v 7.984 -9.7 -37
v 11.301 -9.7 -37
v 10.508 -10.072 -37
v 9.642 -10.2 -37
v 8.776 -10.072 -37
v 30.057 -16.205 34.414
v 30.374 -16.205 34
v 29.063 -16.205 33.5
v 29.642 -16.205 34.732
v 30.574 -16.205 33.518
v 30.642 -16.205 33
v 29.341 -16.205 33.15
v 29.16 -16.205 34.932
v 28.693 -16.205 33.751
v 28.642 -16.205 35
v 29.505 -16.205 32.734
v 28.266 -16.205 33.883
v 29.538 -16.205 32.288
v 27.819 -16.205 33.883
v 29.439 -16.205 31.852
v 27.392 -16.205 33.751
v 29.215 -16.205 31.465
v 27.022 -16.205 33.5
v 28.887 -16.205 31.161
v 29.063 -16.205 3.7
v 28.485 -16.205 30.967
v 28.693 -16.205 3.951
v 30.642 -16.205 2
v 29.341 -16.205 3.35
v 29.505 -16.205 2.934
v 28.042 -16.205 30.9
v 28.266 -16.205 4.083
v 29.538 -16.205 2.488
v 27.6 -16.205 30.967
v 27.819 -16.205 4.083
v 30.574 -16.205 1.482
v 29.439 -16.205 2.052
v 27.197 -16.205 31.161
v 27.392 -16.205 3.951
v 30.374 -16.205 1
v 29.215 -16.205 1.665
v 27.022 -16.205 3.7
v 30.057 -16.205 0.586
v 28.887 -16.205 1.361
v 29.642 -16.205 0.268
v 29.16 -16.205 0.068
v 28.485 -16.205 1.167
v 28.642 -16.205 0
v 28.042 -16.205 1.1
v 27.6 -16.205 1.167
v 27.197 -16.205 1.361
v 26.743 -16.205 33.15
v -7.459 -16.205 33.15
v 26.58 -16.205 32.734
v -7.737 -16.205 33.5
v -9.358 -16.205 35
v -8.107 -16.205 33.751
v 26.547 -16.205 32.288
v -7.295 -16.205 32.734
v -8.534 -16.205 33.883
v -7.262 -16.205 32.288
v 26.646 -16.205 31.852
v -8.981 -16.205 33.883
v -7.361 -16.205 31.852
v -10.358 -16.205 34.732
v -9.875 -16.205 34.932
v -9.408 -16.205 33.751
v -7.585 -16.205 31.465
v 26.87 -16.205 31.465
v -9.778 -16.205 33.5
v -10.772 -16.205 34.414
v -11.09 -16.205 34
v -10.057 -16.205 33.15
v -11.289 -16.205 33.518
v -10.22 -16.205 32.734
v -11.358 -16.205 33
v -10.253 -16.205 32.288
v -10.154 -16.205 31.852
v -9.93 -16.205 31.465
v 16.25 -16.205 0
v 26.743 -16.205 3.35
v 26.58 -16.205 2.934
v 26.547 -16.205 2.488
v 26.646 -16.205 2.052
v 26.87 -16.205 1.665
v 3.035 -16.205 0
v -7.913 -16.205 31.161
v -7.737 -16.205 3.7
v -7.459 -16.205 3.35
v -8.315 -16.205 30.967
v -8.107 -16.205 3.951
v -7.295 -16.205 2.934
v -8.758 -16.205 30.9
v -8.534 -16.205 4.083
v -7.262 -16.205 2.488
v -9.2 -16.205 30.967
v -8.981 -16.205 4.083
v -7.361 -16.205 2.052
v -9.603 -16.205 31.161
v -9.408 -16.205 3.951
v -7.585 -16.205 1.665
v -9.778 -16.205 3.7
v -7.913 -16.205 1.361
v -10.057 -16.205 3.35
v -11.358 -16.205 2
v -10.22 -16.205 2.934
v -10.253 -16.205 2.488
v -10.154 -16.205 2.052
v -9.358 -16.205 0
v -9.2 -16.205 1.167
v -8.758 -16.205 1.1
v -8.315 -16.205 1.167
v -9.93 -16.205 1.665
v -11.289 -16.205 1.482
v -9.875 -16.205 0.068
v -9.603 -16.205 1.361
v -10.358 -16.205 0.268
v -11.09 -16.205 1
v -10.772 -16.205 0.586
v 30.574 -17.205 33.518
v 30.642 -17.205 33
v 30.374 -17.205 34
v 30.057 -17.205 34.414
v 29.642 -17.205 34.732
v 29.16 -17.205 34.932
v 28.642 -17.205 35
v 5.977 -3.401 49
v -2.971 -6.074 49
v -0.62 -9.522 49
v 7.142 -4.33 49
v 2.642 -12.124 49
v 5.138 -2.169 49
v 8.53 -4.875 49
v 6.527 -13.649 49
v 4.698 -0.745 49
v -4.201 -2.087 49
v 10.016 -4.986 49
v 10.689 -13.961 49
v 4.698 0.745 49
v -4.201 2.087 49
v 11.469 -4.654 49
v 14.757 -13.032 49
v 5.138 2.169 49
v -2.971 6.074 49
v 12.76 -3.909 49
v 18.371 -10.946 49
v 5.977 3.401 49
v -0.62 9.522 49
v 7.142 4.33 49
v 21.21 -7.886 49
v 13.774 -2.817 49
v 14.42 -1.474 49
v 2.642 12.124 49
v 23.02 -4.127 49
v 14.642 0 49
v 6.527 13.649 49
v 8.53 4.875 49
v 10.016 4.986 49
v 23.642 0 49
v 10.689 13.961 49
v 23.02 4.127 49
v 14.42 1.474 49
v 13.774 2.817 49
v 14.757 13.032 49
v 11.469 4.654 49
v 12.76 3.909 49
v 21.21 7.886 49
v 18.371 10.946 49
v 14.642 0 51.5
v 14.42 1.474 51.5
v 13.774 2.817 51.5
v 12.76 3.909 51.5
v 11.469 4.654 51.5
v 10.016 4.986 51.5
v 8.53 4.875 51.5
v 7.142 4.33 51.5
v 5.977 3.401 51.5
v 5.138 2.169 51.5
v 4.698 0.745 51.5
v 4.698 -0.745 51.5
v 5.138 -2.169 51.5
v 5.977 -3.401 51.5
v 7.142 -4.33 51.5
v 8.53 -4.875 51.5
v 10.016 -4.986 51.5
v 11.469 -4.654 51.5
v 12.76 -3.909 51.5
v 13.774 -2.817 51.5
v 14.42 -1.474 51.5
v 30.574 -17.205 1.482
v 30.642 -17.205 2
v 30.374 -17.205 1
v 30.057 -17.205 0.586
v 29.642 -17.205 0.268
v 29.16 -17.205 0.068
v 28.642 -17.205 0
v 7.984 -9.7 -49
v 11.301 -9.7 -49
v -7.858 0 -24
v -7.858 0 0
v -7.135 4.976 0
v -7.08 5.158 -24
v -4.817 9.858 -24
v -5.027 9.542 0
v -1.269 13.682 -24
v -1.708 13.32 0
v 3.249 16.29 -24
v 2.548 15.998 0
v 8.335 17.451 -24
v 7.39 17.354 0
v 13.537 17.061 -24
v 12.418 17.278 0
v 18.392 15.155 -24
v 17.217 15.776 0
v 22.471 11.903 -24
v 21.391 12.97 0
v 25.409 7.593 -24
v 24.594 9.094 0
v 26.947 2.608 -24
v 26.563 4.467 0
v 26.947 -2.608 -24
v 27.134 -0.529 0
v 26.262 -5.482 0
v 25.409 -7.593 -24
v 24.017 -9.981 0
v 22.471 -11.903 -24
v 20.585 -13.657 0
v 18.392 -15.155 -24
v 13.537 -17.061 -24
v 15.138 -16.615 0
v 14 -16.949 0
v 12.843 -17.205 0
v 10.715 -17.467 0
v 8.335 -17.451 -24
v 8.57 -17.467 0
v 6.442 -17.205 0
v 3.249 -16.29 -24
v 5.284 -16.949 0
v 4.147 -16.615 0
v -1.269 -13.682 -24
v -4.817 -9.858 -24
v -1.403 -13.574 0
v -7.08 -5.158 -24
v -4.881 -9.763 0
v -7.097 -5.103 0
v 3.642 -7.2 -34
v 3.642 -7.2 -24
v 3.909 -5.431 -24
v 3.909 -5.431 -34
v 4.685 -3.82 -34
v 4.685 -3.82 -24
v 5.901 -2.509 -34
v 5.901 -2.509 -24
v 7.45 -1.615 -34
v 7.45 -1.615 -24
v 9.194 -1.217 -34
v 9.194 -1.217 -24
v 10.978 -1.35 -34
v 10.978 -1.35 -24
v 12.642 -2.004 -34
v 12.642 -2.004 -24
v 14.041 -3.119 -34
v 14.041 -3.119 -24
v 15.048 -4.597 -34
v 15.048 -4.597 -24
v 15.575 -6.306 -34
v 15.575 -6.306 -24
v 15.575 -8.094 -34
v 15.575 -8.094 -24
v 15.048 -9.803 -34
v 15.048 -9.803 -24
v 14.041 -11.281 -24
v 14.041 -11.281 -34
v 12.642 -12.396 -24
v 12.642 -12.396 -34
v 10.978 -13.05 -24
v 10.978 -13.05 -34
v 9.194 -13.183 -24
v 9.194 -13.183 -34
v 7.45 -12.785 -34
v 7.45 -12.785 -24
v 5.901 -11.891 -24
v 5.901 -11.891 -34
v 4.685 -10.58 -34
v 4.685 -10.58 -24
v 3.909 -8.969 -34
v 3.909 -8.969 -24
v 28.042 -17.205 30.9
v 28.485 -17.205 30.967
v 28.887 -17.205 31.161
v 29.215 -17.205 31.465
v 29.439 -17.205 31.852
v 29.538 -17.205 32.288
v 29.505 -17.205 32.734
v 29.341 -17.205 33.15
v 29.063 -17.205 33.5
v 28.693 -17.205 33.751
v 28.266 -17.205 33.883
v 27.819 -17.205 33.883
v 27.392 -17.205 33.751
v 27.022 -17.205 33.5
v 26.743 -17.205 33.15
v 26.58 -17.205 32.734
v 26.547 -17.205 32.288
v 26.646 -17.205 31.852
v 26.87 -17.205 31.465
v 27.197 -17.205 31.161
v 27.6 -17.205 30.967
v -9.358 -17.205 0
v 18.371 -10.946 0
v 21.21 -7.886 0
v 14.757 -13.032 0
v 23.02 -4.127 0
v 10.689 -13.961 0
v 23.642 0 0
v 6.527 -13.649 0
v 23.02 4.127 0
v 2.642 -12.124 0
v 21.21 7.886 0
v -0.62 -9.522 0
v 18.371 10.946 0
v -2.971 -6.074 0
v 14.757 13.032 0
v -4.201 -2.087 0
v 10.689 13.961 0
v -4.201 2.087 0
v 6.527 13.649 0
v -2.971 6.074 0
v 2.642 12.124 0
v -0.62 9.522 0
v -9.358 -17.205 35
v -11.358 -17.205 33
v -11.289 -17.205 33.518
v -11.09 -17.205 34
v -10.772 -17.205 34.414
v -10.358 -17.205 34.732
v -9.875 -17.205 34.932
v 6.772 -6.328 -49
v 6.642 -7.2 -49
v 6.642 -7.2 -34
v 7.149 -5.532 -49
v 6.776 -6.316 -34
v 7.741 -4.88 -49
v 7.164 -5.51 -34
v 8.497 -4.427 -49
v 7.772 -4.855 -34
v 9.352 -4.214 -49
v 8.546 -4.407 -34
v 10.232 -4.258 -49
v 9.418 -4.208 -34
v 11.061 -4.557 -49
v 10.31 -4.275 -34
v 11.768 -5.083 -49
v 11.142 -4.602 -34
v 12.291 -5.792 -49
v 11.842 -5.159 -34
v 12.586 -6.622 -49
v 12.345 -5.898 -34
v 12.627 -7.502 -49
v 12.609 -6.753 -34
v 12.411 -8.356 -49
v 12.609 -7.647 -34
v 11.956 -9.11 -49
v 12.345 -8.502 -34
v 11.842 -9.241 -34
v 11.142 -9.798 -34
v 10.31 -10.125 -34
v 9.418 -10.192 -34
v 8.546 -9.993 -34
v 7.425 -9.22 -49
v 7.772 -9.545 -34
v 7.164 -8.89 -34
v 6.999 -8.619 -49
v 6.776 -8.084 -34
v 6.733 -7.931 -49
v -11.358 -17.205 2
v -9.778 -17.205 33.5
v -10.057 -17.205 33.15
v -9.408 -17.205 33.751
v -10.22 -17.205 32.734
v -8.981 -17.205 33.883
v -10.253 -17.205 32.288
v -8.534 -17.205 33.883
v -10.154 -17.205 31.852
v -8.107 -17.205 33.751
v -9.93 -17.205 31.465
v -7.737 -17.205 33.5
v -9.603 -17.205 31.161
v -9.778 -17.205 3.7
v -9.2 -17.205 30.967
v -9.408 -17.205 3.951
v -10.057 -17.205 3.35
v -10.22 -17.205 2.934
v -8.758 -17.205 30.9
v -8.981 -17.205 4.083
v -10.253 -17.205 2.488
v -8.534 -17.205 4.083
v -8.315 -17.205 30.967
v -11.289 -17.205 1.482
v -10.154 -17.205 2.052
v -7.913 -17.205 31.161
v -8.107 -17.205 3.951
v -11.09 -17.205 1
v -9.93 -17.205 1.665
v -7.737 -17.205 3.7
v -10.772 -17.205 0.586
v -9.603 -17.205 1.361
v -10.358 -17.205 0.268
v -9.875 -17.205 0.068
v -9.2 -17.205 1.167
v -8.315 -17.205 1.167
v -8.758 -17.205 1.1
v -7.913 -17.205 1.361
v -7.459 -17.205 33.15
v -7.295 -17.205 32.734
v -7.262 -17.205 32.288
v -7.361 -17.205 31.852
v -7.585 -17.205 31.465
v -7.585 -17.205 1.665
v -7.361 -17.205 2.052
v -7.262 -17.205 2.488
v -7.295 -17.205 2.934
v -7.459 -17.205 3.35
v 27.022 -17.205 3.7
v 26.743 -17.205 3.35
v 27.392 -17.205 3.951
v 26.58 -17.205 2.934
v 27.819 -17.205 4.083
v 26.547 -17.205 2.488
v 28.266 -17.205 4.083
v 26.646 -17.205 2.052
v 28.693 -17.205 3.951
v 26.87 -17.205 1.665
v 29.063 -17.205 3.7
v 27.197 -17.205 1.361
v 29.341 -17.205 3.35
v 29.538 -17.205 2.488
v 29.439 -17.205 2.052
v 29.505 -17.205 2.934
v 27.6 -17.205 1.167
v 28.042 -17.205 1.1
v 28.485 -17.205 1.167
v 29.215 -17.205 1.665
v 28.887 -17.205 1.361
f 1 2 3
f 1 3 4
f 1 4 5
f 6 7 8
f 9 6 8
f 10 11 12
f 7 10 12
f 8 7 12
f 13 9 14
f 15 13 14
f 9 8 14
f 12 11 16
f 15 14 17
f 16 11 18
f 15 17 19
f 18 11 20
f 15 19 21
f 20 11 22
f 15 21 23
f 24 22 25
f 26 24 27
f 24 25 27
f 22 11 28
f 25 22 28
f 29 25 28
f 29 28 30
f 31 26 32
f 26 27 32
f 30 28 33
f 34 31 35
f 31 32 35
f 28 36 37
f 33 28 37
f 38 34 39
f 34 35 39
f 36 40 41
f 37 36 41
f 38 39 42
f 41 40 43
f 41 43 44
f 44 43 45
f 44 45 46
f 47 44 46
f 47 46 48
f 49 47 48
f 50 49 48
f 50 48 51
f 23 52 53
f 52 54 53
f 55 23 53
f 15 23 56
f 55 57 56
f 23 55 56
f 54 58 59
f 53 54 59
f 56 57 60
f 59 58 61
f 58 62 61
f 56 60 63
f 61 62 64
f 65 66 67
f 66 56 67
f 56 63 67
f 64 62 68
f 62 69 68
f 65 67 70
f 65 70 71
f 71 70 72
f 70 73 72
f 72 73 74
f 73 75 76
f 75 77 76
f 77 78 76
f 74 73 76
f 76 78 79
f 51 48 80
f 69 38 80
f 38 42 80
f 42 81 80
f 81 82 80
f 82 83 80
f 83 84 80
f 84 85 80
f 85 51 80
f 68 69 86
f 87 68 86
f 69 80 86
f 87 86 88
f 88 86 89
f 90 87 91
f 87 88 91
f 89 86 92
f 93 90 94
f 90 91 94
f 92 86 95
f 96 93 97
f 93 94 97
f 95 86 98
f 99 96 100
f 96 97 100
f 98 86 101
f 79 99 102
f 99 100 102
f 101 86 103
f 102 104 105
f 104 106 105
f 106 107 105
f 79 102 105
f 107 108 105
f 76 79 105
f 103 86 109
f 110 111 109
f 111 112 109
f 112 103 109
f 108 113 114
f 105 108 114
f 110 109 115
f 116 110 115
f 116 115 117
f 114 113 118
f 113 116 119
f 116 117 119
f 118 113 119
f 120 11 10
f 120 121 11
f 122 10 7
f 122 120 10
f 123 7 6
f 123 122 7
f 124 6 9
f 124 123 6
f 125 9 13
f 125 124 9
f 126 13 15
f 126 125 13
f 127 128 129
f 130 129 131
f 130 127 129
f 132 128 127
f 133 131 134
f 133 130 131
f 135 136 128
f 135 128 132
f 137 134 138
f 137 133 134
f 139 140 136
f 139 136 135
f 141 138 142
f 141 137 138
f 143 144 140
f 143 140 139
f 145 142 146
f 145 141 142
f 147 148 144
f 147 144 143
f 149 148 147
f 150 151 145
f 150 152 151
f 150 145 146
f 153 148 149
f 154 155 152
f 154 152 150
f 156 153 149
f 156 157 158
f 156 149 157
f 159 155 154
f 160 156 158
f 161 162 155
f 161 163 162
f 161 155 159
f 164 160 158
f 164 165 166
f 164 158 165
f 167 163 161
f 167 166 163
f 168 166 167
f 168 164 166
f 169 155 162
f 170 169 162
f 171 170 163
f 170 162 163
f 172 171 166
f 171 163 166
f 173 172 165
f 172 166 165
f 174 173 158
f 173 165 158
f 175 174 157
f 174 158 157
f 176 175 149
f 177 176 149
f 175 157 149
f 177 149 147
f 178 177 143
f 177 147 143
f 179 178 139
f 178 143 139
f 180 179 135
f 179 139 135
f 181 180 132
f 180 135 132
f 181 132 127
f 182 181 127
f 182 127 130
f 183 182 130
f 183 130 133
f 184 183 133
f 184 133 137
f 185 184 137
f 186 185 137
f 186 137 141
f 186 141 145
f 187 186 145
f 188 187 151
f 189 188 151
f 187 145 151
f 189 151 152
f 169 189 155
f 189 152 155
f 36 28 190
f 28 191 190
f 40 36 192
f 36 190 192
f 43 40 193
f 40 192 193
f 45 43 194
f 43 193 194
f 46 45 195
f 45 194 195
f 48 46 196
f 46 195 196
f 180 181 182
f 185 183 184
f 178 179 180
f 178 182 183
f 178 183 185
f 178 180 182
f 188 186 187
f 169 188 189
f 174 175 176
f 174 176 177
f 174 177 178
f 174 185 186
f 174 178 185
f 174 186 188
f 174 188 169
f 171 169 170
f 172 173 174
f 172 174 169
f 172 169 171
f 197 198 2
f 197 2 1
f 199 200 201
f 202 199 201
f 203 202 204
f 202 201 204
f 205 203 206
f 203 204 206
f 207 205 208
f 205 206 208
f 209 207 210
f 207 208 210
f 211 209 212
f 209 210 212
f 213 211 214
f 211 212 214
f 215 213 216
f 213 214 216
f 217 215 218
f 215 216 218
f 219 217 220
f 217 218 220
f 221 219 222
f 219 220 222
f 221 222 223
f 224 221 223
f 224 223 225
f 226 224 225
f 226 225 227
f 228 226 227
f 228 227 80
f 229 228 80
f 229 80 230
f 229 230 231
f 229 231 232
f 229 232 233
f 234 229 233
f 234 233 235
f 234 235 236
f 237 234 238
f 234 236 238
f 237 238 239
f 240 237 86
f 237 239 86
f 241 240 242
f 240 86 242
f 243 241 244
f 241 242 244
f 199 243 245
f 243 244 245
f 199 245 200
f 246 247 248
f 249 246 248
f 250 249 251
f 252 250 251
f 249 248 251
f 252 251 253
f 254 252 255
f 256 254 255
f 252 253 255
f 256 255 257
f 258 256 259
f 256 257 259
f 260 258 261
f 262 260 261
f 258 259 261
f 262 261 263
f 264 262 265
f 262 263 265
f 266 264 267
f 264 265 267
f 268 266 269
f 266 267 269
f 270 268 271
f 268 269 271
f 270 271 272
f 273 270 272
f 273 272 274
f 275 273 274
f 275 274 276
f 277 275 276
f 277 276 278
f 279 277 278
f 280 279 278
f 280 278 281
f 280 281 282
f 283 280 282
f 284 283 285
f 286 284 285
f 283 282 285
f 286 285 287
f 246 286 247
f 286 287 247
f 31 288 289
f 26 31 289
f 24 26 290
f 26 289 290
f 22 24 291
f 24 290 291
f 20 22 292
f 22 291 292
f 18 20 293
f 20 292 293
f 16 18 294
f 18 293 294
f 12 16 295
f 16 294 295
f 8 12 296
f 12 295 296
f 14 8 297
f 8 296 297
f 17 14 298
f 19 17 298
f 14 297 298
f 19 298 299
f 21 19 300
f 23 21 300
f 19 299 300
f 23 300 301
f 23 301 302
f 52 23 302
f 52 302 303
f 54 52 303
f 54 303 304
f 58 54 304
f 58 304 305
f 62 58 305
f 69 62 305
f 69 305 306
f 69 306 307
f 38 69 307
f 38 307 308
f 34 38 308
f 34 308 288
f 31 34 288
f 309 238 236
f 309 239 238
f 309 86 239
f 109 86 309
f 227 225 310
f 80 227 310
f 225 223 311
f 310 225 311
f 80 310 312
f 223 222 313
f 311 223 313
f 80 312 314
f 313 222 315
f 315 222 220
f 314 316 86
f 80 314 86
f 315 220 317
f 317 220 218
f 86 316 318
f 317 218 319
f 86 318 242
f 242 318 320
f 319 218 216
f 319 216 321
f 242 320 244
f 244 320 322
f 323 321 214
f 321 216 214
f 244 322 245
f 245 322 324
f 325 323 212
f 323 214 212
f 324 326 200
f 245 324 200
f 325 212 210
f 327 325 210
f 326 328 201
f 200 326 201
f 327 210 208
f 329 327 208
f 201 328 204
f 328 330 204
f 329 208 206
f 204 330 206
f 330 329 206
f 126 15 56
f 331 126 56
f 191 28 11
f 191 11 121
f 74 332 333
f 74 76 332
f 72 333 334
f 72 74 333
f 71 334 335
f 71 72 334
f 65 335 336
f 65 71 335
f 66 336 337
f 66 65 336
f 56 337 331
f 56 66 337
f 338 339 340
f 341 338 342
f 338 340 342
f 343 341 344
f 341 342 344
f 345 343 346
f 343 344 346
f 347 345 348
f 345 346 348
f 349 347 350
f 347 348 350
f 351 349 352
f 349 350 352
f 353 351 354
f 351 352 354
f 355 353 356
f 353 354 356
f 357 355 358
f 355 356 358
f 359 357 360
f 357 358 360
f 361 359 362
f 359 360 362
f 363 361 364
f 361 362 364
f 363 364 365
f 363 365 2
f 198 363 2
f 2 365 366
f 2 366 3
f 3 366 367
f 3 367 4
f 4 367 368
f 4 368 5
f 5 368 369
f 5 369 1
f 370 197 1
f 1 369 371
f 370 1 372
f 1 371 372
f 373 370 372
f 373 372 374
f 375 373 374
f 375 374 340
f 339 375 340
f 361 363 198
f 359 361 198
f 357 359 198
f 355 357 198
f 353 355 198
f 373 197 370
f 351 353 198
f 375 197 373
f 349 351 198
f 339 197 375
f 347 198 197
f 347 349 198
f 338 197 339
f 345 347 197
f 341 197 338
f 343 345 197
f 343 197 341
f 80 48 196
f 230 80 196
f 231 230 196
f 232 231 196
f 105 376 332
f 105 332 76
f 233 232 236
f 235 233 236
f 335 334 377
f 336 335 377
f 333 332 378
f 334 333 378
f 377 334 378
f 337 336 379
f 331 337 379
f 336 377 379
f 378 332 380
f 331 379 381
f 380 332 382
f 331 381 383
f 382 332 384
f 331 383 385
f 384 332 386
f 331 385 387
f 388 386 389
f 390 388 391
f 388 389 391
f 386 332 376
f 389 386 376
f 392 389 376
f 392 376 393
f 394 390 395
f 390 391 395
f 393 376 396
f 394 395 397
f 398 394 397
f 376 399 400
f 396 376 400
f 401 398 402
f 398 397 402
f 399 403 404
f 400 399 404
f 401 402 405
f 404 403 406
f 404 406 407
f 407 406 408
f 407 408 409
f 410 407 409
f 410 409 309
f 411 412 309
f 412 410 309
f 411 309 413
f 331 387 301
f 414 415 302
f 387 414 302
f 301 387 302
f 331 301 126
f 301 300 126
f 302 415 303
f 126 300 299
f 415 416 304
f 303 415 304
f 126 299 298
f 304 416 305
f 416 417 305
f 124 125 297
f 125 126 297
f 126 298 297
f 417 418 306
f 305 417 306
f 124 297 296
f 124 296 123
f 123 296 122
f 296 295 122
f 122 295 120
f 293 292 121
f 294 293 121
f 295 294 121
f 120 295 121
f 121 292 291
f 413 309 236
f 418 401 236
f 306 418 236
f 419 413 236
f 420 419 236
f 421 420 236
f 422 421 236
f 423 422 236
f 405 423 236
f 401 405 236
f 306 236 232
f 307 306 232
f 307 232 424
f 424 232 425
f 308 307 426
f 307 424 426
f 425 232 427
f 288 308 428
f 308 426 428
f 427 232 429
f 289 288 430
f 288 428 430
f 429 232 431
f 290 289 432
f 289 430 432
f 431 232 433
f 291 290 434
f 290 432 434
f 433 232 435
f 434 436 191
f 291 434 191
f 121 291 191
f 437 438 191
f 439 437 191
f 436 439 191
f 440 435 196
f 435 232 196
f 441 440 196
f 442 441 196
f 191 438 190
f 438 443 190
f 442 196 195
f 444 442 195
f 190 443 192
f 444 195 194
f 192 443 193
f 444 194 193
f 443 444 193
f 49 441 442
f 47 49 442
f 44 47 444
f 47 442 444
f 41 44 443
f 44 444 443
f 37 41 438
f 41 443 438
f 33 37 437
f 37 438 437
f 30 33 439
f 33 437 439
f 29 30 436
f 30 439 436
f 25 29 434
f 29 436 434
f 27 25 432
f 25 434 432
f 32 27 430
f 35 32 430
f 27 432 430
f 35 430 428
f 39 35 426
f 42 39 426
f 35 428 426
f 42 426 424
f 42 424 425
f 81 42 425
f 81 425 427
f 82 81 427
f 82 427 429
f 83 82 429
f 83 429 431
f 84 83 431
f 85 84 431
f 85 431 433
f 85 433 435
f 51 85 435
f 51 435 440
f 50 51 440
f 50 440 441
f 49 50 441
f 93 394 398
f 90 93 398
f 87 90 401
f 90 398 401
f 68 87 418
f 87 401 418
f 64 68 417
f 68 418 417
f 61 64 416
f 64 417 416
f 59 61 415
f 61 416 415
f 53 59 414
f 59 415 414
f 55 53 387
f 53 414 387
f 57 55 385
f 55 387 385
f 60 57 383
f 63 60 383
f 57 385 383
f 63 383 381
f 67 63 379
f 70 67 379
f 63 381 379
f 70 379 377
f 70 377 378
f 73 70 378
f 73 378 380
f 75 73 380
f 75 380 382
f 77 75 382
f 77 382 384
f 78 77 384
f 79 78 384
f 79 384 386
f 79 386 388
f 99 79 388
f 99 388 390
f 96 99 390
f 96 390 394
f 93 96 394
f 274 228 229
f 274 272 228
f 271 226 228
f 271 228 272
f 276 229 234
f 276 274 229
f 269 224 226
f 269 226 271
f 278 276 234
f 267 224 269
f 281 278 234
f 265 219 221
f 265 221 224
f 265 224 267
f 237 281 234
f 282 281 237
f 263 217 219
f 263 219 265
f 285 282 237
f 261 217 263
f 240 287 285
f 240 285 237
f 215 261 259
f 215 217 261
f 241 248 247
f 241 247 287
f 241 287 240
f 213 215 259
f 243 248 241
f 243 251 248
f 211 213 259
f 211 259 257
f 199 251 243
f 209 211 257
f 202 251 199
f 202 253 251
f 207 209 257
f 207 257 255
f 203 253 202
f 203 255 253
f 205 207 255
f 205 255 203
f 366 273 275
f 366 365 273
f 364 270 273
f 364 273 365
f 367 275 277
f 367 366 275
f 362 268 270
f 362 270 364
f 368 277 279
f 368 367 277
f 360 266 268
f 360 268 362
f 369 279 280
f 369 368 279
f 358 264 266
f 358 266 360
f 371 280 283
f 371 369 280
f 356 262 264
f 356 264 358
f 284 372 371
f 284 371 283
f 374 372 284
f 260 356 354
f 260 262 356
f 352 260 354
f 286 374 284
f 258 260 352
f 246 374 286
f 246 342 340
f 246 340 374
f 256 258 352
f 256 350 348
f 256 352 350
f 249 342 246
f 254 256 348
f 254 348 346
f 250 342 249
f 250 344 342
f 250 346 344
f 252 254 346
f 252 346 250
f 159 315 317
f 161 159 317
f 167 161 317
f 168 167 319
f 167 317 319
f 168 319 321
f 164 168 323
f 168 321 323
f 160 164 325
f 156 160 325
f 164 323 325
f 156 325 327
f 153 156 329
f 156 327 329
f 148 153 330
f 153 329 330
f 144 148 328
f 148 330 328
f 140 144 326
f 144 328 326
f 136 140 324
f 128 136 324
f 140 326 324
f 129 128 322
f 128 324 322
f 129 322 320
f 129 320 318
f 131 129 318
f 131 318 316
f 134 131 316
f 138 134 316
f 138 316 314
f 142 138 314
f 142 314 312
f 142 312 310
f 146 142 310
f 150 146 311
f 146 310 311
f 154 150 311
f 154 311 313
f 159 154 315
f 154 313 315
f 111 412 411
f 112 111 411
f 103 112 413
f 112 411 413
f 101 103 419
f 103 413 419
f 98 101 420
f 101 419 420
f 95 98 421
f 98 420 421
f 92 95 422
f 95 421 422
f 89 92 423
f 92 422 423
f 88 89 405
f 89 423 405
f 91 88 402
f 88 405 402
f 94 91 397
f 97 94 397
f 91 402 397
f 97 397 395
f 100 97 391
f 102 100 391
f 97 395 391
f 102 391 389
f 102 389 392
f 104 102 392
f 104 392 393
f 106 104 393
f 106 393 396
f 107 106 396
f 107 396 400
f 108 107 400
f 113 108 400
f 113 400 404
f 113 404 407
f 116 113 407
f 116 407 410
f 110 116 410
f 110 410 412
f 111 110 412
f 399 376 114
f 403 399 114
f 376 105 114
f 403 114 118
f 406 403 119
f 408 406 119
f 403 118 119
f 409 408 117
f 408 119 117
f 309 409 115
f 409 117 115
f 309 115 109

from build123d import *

# Parameters (mm, degrees)
ESQUISSE1_R             = 14
BOSS_EXTRU_1_DEPTH      = 49
ESQUISSE2_R             = 5
BOSS_EXTRU_2_DEPTH      = 2.5
ESQUISSE3_R             = 17.5
BOSS_EXTRU_3_DEPTH      = 24
ESQUISSE4_R             = 6
BOSS_EXTRU_4_DEPTH      = 10
ESQUISSE5_R             = 3
BOSS_EXTRU_5_DEPTH      = 15
ESQUISSE7_OUTSIDE_W     = 59.406
ESQUISSE7_OUTSIDE_H     = 59.406
ENL_V_MAT_EXTRU_1_DEPTH = 12
BOSS_EXTRU_6_DEPTH      = 35
CONG_1_R                = 2
ESQUISSE9_R             = 1.5
ENL_V_MAT_EXTRU_2_DEPTH = 35


with BuildPart() as part:
    # Esquisse1 → Boss.-Extru.1 (new body)
    with BuildSketch(Plane.XY):
        with Locations((9.642437394, 0)):
            Circle(ESQUISSE1_R)
    extrude(amount=BOSS_EXTRU_1_DEPTH)

    # Esquisse2 → Boss.-Extru.2 (add)
    with BuildSketch(Plane.XY.offset(49)):
        with Locations((9.642437394, 0)):
            Circle(ESQUISSE2_R)
    extrude(amount=BOSS_EXTRU_2_DEPTH)

    # Esquisse3 → Boss.-Extru.3 (add)
    with BuildSketch(Plane(origin=(0, 0, 0), x_dir=(-1, 0, 0), z_dir=(0, 0, -1))):
        with Locations((-9.642437394, 0)):
            Circle(ESQUISSE3_R)
    extrude(amount=BOSS_EXTRU_3_DEPTH)

    # Esquisse4 → Boss.-Extru.4 (add)
    with BuildSketch(Plane(origin=(0, 0, -24), x_dir=(-1, 0, 0), z_dir=(0, 0, -1))):
        with Locations((-9.642437394, -7.2)):
            Circle(ESQUISSE4_R)
    extrude(amount=BOSS_EXTRU_4_DEPTH)

    # Esquisse5 → Boss.-Extru.5 (add)
    with BuildSketch(Plane(origin=(0, 0, -34), x_dir=(-1, 0, 0), z_dir=(0, 0, -1))):
        with Locations((-9.642437394, -7.2)):
            Circle(ESQUISSE5_R)
    extrude(amount=BOSS_EXTRU_5_DEPTH)

    # Esquisse7 outside → Enlèv. mat.-Extru.1 (cut)
    with BuildSketch(Plane(origin=(0, 0, -49), x_dir=(-1, 0, 0), z_dir=(0, 0, -1))):
        with Locations((-9.642, 0)):
            Rectangle(ESQUISSE7_OUTSIDE_W, ESQUISSE7_OUTSIDE_H)
        with BuildLine():
            Line((-11.300749789, -9.7), (-7.984124999, -9.7))
            ThreePointArc((-7.984124999, -9.7), (-9.642437394, -4.2), (-11.300749789, -9.7))
        make_face(mode=Mode.SUBTRACT)
    extrude(amount=-ENL_V_MAT_EXTRU_1_DEPTH, mode=Mode.SUBTRACT)

    # Esquisse8 → Boss.-Extru.6 (add)
    with BuildSketch(Plane.XY):
        Polygon((9.642437394, -16.204776279), (30.642437394, -16.204776279), (30.642437394, -17.204776279), (9.642437394, -17.204776279), (-11.357562606, -17.204776279), (-11.357562606, -16.204776279), align=None)
    extrude(amount=BOSS_EXTRU_6_DEPTH)

    # Congé1
    cong_1_edges = [part.edges().sort_by_distance(p)[0] for p in [
        (-11.357562606, -16.704776279, 0),
        (30.642437394, -16.704776279, 0),
        (-11.357562606, -16.704776279, 35),
        (30.642437394, -16.704776279, 35),
    ]]
    fillet(cong_1_edges, radius=CONG_1_R)

    # Esquisse9 → Enlèv. mat.-Extru.2 (cut)
    with BuildSketch(Plane.XZ.offset(17.204776279)):
        with Locations(Location((28.042437394, 32.4, 0), (0, 0, 270))):
            Circle(ESQUISSE9_R)
        with Locations(Location((-8.757562606, 32.4, 0), (0, 0, 270))):
            Circle(ESQUISSE9_R)
        with Locations(Location((-8.757562606, 2.6, 0), (0, 0, 270))):
            Circle(ESQUISSE9_R)
        with Locations(Location((28.042437394, 2.6, 0), (0, 0, 270))):
            Circle(ESQUISSE9_R)
    extrude(amount=-ENL_V_MAT_EXTRU_2_DEPTH, mode=Mode.SUBTRACT)


solid = part.part
